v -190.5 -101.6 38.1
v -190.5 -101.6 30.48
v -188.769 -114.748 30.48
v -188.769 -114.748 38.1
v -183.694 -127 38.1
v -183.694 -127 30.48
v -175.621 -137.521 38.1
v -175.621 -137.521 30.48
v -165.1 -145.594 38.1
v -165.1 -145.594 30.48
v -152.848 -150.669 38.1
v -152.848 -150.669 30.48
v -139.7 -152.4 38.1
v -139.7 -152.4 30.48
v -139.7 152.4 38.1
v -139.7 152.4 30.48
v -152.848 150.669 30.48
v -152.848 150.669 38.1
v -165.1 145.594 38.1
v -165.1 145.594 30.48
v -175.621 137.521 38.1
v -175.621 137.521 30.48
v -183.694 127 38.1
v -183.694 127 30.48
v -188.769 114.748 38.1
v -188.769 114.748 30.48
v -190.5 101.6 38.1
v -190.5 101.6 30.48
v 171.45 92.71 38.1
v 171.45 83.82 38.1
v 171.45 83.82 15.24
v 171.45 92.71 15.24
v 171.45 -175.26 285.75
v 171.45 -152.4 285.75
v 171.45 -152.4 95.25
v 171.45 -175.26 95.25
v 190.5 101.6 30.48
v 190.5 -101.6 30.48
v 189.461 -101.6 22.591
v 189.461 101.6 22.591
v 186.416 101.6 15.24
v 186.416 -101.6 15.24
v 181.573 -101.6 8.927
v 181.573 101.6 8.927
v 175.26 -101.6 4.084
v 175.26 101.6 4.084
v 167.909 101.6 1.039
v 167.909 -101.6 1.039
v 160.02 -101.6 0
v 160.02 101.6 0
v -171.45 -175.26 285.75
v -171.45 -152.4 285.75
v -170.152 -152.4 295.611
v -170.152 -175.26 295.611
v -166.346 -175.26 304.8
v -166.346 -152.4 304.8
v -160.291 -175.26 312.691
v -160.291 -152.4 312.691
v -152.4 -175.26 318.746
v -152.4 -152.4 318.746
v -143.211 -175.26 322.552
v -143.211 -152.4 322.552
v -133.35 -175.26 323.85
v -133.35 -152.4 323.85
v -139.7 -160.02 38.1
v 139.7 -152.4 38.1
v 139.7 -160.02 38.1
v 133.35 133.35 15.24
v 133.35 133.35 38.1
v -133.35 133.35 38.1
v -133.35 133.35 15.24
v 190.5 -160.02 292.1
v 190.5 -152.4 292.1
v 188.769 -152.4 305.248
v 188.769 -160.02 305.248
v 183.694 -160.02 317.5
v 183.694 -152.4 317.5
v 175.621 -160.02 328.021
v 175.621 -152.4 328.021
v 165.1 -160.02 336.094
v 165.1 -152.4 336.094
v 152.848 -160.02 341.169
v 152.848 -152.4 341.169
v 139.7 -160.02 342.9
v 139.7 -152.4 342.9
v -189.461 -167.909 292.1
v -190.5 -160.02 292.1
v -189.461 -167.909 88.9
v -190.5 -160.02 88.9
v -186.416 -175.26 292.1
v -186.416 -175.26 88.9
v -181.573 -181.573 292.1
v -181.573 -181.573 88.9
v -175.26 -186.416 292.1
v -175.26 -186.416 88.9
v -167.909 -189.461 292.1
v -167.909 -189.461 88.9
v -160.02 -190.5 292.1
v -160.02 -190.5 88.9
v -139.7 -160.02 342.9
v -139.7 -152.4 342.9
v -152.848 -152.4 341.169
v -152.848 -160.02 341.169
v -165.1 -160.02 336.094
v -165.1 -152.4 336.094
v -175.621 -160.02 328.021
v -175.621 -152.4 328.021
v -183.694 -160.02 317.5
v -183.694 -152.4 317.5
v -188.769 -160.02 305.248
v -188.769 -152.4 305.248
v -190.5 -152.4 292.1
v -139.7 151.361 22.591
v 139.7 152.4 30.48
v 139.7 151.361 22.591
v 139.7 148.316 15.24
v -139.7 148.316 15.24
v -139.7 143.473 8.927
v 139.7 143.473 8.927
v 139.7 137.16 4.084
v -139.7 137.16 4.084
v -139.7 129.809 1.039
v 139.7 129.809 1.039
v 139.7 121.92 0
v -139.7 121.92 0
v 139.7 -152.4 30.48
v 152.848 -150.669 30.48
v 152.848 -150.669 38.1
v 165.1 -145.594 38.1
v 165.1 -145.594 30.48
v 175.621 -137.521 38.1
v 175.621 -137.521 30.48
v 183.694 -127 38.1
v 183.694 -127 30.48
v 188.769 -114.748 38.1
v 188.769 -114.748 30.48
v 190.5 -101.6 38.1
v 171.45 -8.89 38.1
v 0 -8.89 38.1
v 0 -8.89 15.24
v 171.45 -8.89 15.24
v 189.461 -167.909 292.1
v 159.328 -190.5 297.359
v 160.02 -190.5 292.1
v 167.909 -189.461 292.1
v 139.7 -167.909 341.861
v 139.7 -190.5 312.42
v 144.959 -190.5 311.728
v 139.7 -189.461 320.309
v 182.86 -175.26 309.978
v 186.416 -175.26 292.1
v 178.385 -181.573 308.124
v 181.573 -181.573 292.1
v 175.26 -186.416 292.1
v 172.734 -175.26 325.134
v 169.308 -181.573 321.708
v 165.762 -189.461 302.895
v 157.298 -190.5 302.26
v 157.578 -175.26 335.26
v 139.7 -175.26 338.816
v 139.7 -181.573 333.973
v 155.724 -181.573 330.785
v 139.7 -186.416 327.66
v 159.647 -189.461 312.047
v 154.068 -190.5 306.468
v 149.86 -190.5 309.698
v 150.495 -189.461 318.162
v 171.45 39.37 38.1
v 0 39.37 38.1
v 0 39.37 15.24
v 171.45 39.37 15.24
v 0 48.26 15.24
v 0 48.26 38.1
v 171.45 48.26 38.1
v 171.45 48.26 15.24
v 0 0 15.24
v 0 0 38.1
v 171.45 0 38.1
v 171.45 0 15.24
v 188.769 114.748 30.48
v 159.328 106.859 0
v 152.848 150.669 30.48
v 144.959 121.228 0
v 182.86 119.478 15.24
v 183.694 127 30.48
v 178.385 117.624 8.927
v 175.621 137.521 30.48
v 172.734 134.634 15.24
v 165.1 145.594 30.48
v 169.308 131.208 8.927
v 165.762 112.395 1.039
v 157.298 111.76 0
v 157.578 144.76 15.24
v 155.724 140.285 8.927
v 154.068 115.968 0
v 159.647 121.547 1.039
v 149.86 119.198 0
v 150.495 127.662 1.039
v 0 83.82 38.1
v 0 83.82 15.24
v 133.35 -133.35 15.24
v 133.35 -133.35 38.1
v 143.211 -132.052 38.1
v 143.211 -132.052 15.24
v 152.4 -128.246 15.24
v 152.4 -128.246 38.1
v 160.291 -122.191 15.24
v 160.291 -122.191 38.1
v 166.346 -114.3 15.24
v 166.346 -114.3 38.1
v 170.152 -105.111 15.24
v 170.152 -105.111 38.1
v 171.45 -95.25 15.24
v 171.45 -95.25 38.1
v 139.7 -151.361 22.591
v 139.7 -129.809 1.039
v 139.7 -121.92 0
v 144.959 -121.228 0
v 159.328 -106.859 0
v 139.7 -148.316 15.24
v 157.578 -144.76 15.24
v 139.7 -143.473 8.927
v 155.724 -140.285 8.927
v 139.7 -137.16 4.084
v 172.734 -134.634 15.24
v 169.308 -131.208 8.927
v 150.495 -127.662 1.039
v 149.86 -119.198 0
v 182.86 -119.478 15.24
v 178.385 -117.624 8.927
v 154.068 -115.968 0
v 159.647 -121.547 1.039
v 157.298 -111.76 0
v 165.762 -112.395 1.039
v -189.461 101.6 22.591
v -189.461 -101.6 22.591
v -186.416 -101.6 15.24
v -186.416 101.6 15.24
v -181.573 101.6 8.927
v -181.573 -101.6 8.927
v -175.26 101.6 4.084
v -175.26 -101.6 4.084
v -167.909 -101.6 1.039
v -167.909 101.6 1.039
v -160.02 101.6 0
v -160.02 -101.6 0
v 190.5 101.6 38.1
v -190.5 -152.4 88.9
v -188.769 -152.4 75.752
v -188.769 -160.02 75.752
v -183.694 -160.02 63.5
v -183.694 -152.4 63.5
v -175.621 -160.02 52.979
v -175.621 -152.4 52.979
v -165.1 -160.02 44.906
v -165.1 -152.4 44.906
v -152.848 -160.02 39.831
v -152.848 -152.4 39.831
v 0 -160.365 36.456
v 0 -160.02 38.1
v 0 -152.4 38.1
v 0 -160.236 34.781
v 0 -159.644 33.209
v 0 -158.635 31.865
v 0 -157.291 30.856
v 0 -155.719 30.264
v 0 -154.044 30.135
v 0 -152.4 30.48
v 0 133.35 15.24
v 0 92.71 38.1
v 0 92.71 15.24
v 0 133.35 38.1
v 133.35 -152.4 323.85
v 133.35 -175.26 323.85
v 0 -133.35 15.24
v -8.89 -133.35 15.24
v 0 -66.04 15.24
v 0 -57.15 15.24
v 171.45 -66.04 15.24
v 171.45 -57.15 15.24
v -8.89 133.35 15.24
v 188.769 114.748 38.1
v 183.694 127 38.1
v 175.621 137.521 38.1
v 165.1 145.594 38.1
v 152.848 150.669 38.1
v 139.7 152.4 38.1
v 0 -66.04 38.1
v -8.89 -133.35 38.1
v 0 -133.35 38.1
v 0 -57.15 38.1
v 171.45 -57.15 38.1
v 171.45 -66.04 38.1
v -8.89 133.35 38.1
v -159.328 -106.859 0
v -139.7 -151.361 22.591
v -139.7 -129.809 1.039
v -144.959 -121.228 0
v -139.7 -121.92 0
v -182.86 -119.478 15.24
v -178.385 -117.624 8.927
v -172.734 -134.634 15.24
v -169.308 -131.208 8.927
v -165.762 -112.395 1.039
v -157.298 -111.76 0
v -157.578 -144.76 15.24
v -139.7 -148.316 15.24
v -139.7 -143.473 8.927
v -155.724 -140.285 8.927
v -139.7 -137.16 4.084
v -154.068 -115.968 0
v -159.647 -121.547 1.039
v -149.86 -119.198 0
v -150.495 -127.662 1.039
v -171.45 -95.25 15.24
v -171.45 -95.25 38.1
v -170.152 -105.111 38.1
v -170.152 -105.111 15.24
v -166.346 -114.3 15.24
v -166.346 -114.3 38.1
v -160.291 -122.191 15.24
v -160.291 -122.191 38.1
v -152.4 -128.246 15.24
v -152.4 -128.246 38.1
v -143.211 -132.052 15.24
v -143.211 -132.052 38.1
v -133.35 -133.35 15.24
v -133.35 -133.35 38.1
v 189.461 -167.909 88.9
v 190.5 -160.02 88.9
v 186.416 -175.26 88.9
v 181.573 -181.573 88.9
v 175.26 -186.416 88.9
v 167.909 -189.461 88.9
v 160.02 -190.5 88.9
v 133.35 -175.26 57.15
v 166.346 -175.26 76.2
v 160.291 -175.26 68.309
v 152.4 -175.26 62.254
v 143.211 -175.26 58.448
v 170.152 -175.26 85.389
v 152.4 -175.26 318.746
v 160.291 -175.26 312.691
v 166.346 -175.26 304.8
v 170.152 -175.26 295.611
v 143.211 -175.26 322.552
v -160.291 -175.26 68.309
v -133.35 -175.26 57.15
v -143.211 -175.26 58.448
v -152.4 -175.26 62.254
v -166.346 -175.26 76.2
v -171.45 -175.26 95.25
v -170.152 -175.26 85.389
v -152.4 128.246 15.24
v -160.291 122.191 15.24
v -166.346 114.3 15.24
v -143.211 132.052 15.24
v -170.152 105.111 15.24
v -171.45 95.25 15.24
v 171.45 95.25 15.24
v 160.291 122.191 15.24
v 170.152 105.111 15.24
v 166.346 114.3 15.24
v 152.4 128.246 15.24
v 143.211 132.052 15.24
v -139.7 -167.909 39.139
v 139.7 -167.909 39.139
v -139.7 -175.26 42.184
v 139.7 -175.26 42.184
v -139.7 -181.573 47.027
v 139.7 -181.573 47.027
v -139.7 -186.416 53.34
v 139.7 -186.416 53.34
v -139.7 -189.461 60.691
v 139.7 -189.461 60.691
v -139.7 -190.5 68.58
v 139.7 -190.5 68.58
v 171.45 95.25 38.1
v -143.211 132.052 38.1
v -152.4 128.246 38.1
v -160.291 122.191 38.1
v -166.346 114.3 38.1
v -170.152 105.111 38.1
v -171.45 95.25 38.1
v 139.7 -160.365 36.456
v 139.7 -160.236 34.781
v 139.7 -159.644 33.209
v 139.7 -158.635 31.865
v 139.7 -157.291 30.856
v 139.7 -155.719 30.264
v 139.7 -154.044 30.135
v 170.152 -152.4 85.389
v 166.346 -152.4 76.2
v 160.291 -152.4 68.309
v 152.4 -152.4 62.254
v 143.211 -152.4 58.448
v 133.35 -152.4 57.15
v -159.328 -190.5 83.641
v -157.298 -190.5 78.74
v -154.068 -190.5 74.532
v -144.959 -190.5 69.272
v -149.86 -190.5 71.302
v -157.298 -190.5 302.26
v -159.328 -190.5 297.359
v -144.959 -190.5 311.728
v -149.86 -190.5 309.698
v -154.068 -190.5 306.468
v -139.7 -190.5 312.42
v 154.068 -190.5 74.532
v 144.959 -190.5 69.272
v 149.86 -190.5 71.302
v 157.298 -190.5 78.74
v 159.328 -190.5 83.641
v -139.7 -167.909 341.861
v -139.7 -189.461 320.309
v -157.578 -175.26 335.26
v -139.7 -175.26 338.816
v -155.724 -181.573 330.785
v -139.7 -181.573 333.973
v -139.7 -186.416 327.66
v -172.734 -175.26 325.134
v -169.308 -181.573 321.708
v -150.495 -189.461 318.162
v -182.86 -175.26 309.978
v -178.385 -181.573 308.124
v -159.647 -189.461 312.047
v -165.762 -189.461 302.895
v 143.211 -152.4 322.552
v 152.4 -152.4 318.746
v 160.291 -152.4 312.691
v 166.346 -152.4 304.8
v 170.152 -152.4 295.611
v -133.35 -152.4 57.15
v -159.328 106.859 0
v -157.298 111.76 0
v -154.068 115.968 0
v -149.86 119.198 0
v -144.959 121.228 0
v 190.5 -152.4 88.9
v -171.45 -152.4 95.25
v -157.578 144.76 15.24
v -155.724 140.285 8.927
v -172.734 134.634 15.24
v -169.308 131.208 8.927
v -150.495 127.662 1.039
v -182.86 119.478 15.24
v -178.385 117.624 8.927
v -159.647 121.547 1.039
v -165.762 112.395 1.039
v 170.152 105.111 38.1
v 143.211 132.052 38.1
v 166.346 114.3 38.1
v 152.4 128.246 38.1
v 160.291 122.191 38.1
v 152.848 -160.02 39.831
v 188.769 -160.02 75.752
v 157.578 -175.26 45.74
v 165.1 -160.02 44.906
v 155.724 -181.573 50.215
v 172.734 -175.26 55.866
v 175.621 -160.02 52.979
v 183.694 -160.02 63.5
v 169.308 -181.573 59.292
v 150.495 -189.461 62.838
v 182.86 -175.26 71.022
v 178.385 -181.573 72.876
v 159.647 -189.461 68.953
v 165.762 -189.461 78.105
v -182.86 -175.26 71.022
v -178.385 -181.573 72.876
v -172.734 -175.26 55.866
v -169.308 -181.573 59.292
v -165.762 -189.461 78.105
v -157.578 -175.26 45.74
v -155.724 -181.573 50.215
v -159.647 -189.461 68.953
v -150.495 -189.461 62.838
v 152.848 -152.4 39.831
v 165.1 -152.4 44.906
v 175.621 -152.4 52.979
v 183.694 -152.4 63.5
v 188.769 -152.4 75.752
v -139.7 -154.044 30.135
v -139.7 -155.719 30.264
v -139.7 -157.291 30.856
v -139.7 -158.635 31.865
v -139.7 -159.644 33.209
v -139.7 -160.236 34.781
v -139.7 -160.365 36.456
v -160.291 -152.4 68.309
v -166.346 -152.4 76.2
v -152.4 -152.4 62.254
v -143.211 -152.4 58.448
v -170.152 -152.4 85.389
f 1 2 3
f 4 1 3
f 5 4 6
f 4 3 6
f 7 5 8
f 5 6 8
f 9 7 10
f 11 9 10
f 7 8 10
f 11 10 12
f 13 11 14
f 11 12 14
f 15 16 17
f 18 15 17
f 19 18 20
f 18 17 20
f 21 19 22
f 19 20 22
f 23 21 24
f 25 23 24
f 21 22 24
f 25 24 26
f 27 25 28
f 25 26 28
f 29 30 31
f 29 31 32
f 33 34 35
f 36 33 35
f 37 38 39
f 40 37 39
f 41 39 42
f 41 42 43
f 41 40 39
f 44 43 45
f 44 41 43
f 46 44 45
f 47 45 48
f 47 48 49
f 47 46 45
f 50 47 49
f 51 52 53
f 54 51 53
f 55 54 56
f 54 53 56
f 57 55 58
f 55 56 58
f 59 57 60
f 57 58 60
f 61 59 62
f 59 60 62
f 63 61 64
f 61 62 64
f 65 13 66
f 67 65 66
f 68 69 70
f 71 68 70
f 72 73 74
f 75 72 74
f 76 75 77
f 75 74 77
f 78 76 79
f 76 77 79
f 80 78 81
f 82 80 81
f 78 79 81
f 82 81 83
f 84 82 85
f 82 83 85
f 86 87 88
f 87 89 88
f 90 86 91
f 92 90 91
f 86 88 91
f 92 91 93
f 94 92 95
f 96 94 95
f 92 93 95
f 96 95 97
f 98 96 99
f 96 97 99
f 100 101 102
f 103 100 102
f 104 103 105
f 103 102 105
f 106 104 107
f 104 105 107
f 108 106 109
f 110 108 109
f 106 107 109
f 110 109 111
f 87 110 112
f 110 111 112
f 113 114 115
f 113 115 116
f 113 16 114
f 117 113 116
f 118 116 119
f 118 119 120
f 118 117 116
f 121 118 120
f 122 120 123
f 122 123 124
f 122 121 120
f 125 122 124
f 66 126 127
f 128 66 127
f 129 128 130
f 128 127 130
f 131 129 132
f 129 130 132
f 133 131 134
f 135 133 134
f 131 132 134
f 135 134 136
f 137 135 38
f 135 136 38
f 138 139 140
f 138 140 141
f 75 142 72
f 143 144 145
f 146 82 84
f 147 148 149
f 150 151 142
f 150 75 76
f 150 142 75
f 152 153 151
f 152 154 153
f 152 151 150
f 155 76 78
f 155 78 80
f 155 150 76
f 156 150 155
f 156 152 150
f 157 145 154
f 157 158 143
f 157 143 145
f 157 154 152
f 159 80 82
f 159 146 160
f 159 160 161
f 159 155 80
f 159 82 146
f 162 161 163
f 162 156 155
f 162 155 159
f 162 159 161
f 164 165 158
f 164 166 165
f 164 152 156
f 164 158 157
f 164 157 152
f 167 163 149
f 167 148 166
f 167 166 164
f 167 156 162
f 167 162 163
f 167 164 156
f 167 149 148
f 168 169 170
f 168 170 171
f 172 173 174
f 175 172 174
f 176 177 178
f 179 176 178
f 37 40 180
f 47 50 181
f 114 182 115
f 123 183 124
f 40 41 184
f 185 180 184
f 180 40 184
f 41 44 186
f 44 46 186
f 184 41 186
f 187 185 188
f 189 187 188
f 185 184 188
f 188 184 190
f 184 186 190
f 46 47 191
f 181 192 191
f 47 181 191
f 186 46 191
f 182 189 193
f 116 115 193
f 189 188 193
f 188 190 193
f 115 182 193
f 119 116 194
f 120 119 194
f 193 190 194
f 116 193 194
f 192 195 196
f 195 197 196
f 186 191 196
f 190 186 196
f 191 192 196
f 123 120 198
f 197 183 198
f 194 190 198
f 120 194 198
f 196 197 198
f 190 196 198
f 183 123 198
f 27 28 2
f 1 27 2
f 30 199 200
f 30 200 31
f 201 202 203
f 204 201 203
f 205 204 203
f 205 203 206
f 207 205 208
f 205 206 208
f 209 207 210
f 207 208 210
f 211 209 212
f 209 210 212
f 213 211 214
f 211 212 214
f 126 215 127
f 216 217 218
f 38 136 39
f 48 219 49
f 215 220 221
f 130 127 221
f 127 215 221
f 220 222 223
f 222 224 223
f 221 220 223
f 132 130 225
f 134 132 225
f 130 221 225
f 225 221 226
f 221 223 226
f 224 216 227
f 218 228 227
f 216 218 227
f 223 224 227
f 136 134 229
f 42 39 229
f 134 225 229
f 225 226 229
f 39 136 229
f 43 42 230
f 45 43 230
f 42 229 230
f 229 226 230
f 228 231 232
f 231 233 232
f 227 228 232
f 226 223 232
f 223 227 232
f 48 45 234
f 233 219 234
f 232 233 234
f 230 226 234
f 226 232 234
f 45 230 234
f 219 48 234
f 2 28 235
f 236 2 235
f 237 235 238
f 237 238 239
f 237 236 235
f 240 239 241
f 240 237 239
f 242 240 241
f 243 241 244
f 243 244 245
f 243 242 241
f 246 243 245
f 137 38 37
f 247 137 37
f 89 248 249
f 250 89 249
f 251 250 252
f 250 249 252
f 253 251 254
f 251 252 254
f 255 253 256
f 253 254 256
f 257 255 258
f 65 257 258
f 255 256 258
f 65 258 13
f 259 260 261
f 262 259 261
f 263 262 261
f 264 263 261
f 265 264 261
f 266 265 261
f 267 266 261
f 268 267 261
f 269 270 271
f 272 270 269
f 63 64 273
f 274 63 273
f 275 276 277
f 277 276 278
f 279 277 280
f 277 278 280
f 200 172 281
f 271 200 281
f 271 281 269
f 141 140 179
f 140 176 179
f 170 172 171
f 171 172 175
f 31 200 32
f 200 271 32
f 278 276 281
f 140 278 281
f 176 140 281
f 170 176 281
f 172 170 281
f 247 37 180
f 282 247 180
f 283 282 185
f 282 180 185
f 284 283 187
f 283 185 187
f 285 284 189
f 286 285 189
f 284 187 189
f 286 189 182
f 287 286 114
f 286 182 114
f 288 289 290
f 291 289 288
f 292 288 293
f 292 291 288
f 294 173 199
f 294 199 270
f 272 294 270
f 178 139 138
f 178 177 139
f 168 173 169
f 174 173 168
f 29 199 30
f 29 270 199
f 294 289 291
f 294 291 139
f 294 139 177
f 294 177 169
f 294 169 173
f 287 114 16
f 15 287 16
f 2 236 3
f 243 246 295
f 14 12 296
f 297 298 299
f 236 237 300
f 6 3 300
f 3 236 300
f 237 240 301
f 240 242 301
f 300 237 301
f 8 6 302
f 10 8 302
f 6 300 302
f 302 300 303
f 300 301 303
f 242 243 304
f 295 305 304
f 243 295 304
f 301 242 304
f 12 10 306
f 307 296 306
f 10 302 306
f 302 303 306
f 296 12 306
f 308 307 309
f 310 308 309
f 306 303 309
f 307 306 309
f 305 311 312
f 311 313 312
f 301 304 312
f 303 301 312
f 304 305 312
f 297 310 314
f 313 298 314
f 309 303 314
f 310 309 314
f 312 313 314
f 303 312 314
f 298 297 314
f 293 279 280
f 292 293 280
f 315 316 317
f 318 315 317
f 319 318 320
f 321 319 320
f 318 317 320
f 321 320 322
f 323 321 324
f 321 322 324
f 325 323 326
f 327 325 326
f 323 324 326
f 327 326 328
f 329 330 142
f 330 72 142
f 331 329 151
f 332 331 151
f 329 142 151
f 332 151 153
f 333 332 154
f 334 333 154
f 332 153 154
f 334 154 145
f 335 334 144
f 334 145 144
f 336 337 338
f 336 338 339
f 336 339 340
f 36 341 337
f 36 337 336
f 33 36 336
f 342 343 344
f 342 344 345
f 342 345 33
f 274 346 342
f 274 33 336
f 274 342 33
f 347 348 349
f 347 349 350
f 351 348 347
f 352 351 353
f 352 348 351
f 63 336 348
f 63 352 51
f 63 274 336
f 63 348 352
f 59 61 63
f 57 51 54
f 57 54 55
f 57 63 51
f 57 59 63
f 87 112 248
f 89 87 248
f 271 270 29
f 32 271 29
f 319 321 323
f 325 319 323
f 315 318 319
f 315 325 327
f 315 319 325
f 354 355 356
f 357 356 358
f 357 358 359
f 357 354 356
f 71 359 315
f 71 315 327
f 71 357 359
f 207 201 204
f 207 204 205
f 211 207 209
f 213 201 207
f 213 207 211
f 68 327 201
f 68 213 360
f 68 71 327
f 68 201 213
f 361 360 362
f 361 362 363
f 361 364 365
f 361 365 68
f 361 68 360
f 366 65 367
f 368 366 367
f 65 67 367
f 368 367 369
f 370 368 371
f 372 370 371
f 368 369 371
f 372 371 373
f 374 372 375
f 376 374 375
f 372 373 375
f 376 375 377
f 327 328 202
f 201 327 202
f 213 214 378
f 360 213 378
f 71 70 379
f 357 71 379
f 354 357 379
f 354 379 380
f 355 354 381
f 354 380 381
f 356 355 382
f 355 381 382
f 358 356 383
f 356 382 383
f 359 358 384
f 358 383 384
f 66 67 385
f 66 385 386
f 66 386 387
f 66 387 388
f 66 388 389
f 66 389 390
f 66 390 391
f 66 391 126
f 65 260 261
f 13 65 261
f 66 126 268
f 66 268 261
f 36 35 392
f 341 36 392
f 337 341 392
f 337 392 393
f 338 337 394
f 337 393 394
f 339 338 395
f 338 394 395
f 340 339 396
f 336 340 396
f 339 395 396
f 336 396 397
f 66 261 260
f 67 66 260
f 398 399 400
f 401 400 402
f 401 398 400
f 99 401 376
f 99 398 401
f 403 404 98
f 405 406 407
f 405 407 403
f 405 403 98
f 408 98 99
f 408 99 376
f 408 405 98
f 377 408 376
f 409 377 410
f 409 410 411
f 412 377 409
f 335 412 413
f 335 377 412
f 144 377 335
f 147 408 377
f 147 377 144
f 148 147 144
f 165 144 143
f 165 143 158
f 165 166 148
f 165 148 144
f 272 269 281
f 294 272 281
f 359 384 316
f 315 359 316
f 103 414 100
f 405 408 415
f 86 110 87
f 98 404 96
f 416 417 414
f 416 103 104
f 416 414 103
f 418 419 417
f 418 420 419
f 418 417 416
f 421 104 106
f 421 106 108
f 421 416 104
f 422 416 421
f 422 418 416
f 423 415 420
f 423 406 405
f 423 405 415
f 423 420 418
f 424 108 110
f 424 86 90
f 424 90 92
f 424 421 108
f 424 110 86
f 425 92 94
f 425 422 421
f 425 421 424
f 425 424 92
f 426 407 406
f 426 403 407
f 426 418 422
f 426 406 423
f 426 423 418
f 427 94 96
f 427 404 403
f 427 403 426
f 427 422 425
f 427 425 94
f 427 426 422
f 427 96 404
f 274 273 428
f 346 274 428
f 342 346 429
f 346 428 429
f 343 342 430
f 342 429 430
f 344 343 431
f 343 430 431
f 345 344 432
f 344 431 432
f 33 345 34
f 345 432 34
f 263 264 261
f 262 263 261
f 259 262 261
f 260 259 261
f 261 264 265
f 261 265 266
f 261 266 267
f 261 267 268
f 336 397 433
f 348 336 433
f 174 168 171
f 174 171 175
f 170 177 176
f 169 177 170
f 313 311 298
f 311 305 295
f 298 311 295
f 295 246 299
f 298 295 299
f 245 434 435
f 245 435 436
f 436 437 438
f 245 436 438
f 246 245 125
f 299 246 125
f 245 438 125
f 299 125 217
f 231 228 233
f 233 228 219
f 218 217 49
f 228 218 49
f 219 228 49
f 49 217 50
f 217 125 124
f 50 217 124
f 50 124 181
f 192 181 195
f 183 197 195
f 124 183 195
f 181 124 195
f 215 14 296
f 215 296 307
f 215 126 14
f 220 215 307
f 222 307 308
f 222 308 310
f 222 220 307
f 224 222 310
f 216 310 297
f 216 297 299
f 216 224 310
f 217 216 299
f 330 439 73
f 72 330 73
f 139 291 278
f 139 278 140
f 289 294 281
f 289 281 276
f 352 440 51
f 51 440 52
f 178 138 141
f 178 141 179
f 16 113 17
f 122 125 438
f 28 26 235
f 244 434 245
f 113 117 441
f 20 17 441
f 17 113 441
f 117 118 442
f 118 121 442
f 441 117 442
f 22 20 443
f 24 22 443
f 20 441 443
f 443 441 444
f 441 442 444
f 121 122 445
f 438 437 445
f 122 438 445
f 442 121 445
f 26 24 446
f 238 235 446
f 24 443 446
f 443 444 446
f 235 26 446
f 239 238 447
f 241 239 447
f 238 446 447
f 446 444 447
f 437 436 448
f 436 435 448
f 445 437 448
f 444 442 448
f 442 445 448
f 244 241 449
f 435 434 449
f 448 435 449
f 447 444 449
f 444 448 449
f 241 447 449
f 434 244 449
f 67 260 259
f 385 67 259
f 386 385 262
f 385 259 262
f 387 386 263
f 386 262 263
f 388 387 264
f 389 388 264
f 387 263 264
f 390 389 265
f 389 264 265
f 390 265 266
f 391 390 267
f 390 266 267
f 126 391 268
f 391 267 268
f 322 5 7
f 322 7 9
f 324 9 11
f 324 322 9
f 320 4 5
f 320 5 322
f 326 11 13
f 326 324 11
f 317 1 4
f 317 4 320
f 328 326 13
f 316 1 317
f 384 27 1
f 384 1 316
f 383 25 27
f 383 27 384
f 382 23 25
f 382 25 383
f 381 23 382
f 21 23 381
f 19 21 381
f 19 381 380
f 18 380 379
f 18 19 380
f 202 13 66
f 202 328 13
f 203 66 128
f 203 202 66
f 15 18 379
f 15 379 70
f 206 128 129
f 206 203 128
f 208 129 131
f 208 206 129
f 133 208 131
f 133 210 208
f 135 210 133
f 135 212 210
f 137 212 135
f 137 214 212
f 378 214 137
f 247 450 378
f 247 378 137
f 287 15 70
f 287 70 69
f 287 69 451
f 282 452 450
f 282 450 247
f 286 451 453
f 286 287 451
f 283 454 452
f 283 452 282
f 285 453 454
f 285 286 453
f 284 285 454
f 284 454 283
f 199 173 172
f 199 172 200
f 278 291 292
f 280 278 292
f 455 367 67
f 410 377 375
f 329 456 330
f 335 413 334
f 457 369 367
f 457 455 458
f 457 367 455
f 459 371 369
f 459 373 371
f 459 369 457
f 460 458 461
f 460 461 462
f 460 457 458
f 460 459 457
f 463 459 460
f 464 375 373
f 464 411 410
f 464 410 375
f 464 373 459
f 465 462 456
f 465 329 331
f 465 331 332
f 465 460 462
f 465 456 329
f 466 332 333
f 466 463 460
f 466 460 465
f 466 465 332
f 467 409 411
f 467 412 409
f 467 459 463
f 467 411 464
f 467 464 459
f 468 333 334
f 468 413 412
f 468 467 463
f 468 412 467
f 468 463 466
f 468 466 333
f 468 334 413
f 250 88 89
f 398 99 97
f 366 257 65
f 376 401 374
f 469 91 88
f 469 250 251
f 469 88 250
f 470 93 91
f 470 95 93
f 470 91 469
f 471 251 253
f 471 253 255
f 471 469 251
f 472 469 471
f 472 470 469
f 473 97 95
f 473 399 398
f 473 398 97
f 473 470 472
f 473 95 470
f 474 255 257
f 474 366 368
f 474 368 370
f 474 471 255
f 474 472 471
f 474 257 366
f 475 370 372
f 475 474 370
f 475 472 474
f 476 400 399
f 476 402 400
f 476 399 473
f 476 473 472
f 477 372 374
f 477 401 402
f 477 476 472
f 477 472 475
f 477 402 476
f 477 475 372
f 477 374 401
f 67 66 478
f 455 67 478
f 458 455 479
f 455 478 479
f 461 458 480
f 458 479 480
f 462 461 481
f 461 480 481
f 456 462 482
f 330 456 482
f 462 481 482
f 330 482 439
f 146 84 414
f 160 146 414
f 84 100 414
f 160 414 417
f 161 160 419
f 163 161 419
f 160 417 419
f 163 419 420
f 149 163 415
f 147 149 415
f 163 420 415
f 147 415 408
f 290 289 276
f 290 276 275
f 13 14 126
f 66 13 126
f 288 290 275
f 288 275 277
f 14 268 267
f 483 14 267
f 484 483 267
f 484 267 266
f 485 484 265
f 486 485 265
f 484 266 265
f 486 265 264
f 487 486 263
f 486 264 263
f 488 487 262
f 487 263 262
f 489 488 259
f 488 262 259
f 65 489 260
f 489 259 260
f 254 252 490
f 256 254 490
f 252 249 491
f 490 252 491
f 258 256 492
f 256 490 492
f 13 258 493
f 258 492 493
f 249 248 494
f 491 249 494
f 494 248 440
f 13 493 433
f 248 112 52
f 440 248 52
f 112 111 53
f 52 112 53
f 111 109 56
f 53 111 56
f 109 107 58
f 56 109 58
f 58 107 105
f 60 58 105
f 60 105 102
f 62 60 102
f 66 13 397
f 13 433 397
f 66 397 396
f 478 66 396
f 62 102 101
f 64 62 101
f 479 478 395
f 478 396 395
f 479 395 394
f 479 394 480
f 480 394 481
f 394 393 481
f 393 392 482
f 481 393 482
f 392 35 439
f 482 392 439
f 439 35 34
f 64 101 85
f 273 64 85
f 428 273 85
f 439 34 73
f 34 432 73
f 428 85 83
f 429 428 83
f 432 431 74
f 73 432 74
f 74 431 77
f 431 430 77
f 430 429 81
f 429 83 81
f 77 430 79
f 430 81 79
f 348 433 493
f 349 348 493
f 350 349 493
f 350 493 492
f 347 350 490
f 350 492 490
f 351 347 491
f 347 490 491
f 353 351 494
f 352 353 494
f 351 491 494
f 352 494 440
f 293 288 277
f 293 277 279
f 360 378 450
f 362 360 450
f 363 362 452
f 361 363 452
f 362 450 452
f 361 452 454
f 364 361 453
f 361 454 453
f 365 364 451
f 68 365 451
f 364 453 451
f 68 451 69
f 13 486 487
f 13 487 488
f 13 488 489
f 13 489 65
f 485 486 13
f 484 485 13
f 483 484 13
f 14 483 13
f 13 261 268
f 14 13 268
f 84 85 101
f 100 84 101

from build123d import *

# Parameters (mm, degrees)
F1_DEPTH  = 38.1
F2_R      = 30.48
F4_DEPTH  = 38.1
F5_R      = 30.48
F7_DEPTH  = 139.7
F8_DEPTH  = 139.7
F10_DEPTH = 22.86
F13_DEPTH = 22.86
F14_W     = 171.45
F14_H     = 8.89
F15_DEPTH = 22.86


with BuildPart() as f1:
    # F0 (on Top) → F1 (new body)
    with BuildSketch(Plane.XY):
        with BuildLine():
            Line((-139.7, -152.4), (139.7, -152.4))
            ThreePointArc((139.7, -152.4), (175.621024, -137.521024), (190.5, -101.6))
            Line((190.5, -101.6), (190.5, 101.6))
            ThreePointArc((190.5, 101.6), (175.621024, 137.521024), (139.7, 152.4))
            Line((139.7, 152.4), (-139.7, 152.4))
            ThreePointArc((-139.7, 152.4), (-175.621024, 137.521024), (-190.5, 101.6))
            Line((-190.5, 101.6), (-190.5, -101.6))
            ThreePointArc((-190.5, -101.6), (-175.621024, -137.521024), (-139.7, -152.4))
        make_face()
    extrude(amount=F1_DEPTH)

    # F2
    f2_edges = [f1.edges().sort_by_distance(p)[0] for p in [
        (0, -152.4, 0),
    ]]
    fillet(f2_edges, radius=F2_R)

    # F12 (on face) → F13 (cut)
    with BuildSketch(Plane.XY.offset(38.1)):
        with BuildLine():
            ThreePointArc((-133.35, 133.35), (-160.290768, 122.190768), (-171.45, 95.25))
            Line((-171.45, 95.25), (-171.45, 0))
            Line((-171.45, 0), (-171.45, -95.25))
            ThreePointArc((-171.45, -95.25), (-160.290768, -122.190768), (-133.35, -133.35))
            Line((-133.35, -133.35), (0, -133.35))
            Line((0, -133.35), (133.35, -133.35))
            ThreePointArc((133.35, -133.35), (160.290768, -122.190768), (171.45, -95.25))
            Line((171.45, -95.25), (171.45, 0))
            Line((171.45, 0), (171.45, 95.25))
            ThreePointArc((171.45, 95.25), (160.290768, 122.190768), (133.35, 133.35))
            Line((133.35, 133.35), (0, 133.35))
            Line((0, 133.35), (-133.35, 133.35))
        make_face()
    extrude(amount=-F13_DEPTH, mode=Mode.SUBTRACT)


with BuildPart() as f4:
    # F3 (on face) → F4 (new body)
    with BuildSketch(Plane.XZ.offset(152.4)):
        with BuildLine():
            Line((139.7, 342.9), (-139.7, 342.9))
            ThreePointArc((-139.7, 342.9), (-175.621024, 328.021024), (-190.5, 292.1))
            Line((-190.5, 292.1), (-190.5, 88.9))
            ThreePointArc((-190.5, 88.9), (-175.621024, 52.978976), (-139.7, 38.1))
            Line((-139.7, 38.1), (139.7, 38.1))
            ThreePointArc((139.7, 38.1), (175.621024, 52.978976), (190.5, 88.9))
            Line((190.5, 88.9), (190.5, 292.1))
            ThreePointArc((190.5, 292.1), (175.621024, 328.021024), (139.7, 342.9))
        make_face()
    extrude(amount=F4_DEPTH)

    # F5
    f5_edges = [f4.edges().sort_by_distance(p)[0] for p in [
        (-190.5, -190.5, 190.5),
    ]]
    fillet(f5_edges, radius=F5_R)

    # F9 (on face) → F10 (cut)
    with BuildSketch(Plane(origin=(0, -152.4, 0), x_dir=(-1, 0, 0), z_dir=(0, 1, 0))):
        with BuildLine():
            Line((-133.35, 57.15), (133.35, 57.15))
            ThreePointArc((133.35, 57.15), (160.290768, 68.309232), (171.45, 95.25))
            Line((171.45, 95.25), (171.45, 285.75))
            ThreePointArc((171.45, 285.75), (160.290768, 312.690768), (133.35, 323.85))
            Line((133.35, 323.85), (-133.35, 323.85))
            ThreePointArc((-133.35, 323.85), (-160.290768, 312.690768), (-171.45, 285.75))
            Line((-171.45, 285.75), (-171.45, 95.25))
            ThreePointArc((-171.45, 95.25), (-160.290768, 68.309232), (-133.35, 57.15))
        make_face()
    extrude(amount=-F10_DEPTH, mode=Mode.SUBTRACT)


with BuildPart() as f7:
    # F6 (on Right) → F7 (new body)
    with BuildSketch(Plane.YZ):
        with BuildLine():
            Line((-152.4, 38.1), (-160.02, 38.1))
            ThreePointArc((-160.02, 38.1), (-158.635324, 31.864676), (-152.4, 30.48))
            Line((-152.4, 30.48), (-152.4, 38.1))
        make_face()
    extrude(amount=F7_DEPTH)


with BuildPart() as f8:
    # F7_face (on face) → F8 (new body)
    with BuildSketch(Plane(origin=(0, -156.023531, 34.476469), x_dir=(0, 1, 0), z_dir=(-1, 0, 0))):
        with BuildLine():
            Line((3.623531, -3.623531), (3.623531, 3.996469))
            ThreePointArc((3.623531, 3.996469), (-2.611793, 2.611793), (-3.996469, -3.623531))
            Line((-3.996469, -3.623531), (3.623531, -3.623531))
        make_face()
    extrude(amount=F8_DEPTH)


with BuildPart() as f15:
    # F14 (on face) → F15 (new body)
    with BuildSketch(Plane.XY.offset(38.1)):
        Polygon((0, -8.89), (0, 0), (0, 39.37), (0, 48.26), (0, 83.82), (0, 92.71), (0, 133.35), (-8.89, 133.35), (-8.89, -133.35), (0, -133.35), (0, -66.04), (0, -57.15), align=None)
        with Locations((85.725, -4.445)):
            Rectangle(F14_W, F14_H)
        with Locations((85.725, 43.815)):
            Rectangle(F14_W, F14_H)
        with Locations((85.725, -61.595)):
            Rectangle(F14_W, F14_H)
        with Locations((85.725, 88.265)):
            Rectangle(F14_W, F14_H)
    extrude(amount=-F15_DEPTH)


solid = Compound([f1.part, f4.part, f7.part, f8.part, f15.part])
